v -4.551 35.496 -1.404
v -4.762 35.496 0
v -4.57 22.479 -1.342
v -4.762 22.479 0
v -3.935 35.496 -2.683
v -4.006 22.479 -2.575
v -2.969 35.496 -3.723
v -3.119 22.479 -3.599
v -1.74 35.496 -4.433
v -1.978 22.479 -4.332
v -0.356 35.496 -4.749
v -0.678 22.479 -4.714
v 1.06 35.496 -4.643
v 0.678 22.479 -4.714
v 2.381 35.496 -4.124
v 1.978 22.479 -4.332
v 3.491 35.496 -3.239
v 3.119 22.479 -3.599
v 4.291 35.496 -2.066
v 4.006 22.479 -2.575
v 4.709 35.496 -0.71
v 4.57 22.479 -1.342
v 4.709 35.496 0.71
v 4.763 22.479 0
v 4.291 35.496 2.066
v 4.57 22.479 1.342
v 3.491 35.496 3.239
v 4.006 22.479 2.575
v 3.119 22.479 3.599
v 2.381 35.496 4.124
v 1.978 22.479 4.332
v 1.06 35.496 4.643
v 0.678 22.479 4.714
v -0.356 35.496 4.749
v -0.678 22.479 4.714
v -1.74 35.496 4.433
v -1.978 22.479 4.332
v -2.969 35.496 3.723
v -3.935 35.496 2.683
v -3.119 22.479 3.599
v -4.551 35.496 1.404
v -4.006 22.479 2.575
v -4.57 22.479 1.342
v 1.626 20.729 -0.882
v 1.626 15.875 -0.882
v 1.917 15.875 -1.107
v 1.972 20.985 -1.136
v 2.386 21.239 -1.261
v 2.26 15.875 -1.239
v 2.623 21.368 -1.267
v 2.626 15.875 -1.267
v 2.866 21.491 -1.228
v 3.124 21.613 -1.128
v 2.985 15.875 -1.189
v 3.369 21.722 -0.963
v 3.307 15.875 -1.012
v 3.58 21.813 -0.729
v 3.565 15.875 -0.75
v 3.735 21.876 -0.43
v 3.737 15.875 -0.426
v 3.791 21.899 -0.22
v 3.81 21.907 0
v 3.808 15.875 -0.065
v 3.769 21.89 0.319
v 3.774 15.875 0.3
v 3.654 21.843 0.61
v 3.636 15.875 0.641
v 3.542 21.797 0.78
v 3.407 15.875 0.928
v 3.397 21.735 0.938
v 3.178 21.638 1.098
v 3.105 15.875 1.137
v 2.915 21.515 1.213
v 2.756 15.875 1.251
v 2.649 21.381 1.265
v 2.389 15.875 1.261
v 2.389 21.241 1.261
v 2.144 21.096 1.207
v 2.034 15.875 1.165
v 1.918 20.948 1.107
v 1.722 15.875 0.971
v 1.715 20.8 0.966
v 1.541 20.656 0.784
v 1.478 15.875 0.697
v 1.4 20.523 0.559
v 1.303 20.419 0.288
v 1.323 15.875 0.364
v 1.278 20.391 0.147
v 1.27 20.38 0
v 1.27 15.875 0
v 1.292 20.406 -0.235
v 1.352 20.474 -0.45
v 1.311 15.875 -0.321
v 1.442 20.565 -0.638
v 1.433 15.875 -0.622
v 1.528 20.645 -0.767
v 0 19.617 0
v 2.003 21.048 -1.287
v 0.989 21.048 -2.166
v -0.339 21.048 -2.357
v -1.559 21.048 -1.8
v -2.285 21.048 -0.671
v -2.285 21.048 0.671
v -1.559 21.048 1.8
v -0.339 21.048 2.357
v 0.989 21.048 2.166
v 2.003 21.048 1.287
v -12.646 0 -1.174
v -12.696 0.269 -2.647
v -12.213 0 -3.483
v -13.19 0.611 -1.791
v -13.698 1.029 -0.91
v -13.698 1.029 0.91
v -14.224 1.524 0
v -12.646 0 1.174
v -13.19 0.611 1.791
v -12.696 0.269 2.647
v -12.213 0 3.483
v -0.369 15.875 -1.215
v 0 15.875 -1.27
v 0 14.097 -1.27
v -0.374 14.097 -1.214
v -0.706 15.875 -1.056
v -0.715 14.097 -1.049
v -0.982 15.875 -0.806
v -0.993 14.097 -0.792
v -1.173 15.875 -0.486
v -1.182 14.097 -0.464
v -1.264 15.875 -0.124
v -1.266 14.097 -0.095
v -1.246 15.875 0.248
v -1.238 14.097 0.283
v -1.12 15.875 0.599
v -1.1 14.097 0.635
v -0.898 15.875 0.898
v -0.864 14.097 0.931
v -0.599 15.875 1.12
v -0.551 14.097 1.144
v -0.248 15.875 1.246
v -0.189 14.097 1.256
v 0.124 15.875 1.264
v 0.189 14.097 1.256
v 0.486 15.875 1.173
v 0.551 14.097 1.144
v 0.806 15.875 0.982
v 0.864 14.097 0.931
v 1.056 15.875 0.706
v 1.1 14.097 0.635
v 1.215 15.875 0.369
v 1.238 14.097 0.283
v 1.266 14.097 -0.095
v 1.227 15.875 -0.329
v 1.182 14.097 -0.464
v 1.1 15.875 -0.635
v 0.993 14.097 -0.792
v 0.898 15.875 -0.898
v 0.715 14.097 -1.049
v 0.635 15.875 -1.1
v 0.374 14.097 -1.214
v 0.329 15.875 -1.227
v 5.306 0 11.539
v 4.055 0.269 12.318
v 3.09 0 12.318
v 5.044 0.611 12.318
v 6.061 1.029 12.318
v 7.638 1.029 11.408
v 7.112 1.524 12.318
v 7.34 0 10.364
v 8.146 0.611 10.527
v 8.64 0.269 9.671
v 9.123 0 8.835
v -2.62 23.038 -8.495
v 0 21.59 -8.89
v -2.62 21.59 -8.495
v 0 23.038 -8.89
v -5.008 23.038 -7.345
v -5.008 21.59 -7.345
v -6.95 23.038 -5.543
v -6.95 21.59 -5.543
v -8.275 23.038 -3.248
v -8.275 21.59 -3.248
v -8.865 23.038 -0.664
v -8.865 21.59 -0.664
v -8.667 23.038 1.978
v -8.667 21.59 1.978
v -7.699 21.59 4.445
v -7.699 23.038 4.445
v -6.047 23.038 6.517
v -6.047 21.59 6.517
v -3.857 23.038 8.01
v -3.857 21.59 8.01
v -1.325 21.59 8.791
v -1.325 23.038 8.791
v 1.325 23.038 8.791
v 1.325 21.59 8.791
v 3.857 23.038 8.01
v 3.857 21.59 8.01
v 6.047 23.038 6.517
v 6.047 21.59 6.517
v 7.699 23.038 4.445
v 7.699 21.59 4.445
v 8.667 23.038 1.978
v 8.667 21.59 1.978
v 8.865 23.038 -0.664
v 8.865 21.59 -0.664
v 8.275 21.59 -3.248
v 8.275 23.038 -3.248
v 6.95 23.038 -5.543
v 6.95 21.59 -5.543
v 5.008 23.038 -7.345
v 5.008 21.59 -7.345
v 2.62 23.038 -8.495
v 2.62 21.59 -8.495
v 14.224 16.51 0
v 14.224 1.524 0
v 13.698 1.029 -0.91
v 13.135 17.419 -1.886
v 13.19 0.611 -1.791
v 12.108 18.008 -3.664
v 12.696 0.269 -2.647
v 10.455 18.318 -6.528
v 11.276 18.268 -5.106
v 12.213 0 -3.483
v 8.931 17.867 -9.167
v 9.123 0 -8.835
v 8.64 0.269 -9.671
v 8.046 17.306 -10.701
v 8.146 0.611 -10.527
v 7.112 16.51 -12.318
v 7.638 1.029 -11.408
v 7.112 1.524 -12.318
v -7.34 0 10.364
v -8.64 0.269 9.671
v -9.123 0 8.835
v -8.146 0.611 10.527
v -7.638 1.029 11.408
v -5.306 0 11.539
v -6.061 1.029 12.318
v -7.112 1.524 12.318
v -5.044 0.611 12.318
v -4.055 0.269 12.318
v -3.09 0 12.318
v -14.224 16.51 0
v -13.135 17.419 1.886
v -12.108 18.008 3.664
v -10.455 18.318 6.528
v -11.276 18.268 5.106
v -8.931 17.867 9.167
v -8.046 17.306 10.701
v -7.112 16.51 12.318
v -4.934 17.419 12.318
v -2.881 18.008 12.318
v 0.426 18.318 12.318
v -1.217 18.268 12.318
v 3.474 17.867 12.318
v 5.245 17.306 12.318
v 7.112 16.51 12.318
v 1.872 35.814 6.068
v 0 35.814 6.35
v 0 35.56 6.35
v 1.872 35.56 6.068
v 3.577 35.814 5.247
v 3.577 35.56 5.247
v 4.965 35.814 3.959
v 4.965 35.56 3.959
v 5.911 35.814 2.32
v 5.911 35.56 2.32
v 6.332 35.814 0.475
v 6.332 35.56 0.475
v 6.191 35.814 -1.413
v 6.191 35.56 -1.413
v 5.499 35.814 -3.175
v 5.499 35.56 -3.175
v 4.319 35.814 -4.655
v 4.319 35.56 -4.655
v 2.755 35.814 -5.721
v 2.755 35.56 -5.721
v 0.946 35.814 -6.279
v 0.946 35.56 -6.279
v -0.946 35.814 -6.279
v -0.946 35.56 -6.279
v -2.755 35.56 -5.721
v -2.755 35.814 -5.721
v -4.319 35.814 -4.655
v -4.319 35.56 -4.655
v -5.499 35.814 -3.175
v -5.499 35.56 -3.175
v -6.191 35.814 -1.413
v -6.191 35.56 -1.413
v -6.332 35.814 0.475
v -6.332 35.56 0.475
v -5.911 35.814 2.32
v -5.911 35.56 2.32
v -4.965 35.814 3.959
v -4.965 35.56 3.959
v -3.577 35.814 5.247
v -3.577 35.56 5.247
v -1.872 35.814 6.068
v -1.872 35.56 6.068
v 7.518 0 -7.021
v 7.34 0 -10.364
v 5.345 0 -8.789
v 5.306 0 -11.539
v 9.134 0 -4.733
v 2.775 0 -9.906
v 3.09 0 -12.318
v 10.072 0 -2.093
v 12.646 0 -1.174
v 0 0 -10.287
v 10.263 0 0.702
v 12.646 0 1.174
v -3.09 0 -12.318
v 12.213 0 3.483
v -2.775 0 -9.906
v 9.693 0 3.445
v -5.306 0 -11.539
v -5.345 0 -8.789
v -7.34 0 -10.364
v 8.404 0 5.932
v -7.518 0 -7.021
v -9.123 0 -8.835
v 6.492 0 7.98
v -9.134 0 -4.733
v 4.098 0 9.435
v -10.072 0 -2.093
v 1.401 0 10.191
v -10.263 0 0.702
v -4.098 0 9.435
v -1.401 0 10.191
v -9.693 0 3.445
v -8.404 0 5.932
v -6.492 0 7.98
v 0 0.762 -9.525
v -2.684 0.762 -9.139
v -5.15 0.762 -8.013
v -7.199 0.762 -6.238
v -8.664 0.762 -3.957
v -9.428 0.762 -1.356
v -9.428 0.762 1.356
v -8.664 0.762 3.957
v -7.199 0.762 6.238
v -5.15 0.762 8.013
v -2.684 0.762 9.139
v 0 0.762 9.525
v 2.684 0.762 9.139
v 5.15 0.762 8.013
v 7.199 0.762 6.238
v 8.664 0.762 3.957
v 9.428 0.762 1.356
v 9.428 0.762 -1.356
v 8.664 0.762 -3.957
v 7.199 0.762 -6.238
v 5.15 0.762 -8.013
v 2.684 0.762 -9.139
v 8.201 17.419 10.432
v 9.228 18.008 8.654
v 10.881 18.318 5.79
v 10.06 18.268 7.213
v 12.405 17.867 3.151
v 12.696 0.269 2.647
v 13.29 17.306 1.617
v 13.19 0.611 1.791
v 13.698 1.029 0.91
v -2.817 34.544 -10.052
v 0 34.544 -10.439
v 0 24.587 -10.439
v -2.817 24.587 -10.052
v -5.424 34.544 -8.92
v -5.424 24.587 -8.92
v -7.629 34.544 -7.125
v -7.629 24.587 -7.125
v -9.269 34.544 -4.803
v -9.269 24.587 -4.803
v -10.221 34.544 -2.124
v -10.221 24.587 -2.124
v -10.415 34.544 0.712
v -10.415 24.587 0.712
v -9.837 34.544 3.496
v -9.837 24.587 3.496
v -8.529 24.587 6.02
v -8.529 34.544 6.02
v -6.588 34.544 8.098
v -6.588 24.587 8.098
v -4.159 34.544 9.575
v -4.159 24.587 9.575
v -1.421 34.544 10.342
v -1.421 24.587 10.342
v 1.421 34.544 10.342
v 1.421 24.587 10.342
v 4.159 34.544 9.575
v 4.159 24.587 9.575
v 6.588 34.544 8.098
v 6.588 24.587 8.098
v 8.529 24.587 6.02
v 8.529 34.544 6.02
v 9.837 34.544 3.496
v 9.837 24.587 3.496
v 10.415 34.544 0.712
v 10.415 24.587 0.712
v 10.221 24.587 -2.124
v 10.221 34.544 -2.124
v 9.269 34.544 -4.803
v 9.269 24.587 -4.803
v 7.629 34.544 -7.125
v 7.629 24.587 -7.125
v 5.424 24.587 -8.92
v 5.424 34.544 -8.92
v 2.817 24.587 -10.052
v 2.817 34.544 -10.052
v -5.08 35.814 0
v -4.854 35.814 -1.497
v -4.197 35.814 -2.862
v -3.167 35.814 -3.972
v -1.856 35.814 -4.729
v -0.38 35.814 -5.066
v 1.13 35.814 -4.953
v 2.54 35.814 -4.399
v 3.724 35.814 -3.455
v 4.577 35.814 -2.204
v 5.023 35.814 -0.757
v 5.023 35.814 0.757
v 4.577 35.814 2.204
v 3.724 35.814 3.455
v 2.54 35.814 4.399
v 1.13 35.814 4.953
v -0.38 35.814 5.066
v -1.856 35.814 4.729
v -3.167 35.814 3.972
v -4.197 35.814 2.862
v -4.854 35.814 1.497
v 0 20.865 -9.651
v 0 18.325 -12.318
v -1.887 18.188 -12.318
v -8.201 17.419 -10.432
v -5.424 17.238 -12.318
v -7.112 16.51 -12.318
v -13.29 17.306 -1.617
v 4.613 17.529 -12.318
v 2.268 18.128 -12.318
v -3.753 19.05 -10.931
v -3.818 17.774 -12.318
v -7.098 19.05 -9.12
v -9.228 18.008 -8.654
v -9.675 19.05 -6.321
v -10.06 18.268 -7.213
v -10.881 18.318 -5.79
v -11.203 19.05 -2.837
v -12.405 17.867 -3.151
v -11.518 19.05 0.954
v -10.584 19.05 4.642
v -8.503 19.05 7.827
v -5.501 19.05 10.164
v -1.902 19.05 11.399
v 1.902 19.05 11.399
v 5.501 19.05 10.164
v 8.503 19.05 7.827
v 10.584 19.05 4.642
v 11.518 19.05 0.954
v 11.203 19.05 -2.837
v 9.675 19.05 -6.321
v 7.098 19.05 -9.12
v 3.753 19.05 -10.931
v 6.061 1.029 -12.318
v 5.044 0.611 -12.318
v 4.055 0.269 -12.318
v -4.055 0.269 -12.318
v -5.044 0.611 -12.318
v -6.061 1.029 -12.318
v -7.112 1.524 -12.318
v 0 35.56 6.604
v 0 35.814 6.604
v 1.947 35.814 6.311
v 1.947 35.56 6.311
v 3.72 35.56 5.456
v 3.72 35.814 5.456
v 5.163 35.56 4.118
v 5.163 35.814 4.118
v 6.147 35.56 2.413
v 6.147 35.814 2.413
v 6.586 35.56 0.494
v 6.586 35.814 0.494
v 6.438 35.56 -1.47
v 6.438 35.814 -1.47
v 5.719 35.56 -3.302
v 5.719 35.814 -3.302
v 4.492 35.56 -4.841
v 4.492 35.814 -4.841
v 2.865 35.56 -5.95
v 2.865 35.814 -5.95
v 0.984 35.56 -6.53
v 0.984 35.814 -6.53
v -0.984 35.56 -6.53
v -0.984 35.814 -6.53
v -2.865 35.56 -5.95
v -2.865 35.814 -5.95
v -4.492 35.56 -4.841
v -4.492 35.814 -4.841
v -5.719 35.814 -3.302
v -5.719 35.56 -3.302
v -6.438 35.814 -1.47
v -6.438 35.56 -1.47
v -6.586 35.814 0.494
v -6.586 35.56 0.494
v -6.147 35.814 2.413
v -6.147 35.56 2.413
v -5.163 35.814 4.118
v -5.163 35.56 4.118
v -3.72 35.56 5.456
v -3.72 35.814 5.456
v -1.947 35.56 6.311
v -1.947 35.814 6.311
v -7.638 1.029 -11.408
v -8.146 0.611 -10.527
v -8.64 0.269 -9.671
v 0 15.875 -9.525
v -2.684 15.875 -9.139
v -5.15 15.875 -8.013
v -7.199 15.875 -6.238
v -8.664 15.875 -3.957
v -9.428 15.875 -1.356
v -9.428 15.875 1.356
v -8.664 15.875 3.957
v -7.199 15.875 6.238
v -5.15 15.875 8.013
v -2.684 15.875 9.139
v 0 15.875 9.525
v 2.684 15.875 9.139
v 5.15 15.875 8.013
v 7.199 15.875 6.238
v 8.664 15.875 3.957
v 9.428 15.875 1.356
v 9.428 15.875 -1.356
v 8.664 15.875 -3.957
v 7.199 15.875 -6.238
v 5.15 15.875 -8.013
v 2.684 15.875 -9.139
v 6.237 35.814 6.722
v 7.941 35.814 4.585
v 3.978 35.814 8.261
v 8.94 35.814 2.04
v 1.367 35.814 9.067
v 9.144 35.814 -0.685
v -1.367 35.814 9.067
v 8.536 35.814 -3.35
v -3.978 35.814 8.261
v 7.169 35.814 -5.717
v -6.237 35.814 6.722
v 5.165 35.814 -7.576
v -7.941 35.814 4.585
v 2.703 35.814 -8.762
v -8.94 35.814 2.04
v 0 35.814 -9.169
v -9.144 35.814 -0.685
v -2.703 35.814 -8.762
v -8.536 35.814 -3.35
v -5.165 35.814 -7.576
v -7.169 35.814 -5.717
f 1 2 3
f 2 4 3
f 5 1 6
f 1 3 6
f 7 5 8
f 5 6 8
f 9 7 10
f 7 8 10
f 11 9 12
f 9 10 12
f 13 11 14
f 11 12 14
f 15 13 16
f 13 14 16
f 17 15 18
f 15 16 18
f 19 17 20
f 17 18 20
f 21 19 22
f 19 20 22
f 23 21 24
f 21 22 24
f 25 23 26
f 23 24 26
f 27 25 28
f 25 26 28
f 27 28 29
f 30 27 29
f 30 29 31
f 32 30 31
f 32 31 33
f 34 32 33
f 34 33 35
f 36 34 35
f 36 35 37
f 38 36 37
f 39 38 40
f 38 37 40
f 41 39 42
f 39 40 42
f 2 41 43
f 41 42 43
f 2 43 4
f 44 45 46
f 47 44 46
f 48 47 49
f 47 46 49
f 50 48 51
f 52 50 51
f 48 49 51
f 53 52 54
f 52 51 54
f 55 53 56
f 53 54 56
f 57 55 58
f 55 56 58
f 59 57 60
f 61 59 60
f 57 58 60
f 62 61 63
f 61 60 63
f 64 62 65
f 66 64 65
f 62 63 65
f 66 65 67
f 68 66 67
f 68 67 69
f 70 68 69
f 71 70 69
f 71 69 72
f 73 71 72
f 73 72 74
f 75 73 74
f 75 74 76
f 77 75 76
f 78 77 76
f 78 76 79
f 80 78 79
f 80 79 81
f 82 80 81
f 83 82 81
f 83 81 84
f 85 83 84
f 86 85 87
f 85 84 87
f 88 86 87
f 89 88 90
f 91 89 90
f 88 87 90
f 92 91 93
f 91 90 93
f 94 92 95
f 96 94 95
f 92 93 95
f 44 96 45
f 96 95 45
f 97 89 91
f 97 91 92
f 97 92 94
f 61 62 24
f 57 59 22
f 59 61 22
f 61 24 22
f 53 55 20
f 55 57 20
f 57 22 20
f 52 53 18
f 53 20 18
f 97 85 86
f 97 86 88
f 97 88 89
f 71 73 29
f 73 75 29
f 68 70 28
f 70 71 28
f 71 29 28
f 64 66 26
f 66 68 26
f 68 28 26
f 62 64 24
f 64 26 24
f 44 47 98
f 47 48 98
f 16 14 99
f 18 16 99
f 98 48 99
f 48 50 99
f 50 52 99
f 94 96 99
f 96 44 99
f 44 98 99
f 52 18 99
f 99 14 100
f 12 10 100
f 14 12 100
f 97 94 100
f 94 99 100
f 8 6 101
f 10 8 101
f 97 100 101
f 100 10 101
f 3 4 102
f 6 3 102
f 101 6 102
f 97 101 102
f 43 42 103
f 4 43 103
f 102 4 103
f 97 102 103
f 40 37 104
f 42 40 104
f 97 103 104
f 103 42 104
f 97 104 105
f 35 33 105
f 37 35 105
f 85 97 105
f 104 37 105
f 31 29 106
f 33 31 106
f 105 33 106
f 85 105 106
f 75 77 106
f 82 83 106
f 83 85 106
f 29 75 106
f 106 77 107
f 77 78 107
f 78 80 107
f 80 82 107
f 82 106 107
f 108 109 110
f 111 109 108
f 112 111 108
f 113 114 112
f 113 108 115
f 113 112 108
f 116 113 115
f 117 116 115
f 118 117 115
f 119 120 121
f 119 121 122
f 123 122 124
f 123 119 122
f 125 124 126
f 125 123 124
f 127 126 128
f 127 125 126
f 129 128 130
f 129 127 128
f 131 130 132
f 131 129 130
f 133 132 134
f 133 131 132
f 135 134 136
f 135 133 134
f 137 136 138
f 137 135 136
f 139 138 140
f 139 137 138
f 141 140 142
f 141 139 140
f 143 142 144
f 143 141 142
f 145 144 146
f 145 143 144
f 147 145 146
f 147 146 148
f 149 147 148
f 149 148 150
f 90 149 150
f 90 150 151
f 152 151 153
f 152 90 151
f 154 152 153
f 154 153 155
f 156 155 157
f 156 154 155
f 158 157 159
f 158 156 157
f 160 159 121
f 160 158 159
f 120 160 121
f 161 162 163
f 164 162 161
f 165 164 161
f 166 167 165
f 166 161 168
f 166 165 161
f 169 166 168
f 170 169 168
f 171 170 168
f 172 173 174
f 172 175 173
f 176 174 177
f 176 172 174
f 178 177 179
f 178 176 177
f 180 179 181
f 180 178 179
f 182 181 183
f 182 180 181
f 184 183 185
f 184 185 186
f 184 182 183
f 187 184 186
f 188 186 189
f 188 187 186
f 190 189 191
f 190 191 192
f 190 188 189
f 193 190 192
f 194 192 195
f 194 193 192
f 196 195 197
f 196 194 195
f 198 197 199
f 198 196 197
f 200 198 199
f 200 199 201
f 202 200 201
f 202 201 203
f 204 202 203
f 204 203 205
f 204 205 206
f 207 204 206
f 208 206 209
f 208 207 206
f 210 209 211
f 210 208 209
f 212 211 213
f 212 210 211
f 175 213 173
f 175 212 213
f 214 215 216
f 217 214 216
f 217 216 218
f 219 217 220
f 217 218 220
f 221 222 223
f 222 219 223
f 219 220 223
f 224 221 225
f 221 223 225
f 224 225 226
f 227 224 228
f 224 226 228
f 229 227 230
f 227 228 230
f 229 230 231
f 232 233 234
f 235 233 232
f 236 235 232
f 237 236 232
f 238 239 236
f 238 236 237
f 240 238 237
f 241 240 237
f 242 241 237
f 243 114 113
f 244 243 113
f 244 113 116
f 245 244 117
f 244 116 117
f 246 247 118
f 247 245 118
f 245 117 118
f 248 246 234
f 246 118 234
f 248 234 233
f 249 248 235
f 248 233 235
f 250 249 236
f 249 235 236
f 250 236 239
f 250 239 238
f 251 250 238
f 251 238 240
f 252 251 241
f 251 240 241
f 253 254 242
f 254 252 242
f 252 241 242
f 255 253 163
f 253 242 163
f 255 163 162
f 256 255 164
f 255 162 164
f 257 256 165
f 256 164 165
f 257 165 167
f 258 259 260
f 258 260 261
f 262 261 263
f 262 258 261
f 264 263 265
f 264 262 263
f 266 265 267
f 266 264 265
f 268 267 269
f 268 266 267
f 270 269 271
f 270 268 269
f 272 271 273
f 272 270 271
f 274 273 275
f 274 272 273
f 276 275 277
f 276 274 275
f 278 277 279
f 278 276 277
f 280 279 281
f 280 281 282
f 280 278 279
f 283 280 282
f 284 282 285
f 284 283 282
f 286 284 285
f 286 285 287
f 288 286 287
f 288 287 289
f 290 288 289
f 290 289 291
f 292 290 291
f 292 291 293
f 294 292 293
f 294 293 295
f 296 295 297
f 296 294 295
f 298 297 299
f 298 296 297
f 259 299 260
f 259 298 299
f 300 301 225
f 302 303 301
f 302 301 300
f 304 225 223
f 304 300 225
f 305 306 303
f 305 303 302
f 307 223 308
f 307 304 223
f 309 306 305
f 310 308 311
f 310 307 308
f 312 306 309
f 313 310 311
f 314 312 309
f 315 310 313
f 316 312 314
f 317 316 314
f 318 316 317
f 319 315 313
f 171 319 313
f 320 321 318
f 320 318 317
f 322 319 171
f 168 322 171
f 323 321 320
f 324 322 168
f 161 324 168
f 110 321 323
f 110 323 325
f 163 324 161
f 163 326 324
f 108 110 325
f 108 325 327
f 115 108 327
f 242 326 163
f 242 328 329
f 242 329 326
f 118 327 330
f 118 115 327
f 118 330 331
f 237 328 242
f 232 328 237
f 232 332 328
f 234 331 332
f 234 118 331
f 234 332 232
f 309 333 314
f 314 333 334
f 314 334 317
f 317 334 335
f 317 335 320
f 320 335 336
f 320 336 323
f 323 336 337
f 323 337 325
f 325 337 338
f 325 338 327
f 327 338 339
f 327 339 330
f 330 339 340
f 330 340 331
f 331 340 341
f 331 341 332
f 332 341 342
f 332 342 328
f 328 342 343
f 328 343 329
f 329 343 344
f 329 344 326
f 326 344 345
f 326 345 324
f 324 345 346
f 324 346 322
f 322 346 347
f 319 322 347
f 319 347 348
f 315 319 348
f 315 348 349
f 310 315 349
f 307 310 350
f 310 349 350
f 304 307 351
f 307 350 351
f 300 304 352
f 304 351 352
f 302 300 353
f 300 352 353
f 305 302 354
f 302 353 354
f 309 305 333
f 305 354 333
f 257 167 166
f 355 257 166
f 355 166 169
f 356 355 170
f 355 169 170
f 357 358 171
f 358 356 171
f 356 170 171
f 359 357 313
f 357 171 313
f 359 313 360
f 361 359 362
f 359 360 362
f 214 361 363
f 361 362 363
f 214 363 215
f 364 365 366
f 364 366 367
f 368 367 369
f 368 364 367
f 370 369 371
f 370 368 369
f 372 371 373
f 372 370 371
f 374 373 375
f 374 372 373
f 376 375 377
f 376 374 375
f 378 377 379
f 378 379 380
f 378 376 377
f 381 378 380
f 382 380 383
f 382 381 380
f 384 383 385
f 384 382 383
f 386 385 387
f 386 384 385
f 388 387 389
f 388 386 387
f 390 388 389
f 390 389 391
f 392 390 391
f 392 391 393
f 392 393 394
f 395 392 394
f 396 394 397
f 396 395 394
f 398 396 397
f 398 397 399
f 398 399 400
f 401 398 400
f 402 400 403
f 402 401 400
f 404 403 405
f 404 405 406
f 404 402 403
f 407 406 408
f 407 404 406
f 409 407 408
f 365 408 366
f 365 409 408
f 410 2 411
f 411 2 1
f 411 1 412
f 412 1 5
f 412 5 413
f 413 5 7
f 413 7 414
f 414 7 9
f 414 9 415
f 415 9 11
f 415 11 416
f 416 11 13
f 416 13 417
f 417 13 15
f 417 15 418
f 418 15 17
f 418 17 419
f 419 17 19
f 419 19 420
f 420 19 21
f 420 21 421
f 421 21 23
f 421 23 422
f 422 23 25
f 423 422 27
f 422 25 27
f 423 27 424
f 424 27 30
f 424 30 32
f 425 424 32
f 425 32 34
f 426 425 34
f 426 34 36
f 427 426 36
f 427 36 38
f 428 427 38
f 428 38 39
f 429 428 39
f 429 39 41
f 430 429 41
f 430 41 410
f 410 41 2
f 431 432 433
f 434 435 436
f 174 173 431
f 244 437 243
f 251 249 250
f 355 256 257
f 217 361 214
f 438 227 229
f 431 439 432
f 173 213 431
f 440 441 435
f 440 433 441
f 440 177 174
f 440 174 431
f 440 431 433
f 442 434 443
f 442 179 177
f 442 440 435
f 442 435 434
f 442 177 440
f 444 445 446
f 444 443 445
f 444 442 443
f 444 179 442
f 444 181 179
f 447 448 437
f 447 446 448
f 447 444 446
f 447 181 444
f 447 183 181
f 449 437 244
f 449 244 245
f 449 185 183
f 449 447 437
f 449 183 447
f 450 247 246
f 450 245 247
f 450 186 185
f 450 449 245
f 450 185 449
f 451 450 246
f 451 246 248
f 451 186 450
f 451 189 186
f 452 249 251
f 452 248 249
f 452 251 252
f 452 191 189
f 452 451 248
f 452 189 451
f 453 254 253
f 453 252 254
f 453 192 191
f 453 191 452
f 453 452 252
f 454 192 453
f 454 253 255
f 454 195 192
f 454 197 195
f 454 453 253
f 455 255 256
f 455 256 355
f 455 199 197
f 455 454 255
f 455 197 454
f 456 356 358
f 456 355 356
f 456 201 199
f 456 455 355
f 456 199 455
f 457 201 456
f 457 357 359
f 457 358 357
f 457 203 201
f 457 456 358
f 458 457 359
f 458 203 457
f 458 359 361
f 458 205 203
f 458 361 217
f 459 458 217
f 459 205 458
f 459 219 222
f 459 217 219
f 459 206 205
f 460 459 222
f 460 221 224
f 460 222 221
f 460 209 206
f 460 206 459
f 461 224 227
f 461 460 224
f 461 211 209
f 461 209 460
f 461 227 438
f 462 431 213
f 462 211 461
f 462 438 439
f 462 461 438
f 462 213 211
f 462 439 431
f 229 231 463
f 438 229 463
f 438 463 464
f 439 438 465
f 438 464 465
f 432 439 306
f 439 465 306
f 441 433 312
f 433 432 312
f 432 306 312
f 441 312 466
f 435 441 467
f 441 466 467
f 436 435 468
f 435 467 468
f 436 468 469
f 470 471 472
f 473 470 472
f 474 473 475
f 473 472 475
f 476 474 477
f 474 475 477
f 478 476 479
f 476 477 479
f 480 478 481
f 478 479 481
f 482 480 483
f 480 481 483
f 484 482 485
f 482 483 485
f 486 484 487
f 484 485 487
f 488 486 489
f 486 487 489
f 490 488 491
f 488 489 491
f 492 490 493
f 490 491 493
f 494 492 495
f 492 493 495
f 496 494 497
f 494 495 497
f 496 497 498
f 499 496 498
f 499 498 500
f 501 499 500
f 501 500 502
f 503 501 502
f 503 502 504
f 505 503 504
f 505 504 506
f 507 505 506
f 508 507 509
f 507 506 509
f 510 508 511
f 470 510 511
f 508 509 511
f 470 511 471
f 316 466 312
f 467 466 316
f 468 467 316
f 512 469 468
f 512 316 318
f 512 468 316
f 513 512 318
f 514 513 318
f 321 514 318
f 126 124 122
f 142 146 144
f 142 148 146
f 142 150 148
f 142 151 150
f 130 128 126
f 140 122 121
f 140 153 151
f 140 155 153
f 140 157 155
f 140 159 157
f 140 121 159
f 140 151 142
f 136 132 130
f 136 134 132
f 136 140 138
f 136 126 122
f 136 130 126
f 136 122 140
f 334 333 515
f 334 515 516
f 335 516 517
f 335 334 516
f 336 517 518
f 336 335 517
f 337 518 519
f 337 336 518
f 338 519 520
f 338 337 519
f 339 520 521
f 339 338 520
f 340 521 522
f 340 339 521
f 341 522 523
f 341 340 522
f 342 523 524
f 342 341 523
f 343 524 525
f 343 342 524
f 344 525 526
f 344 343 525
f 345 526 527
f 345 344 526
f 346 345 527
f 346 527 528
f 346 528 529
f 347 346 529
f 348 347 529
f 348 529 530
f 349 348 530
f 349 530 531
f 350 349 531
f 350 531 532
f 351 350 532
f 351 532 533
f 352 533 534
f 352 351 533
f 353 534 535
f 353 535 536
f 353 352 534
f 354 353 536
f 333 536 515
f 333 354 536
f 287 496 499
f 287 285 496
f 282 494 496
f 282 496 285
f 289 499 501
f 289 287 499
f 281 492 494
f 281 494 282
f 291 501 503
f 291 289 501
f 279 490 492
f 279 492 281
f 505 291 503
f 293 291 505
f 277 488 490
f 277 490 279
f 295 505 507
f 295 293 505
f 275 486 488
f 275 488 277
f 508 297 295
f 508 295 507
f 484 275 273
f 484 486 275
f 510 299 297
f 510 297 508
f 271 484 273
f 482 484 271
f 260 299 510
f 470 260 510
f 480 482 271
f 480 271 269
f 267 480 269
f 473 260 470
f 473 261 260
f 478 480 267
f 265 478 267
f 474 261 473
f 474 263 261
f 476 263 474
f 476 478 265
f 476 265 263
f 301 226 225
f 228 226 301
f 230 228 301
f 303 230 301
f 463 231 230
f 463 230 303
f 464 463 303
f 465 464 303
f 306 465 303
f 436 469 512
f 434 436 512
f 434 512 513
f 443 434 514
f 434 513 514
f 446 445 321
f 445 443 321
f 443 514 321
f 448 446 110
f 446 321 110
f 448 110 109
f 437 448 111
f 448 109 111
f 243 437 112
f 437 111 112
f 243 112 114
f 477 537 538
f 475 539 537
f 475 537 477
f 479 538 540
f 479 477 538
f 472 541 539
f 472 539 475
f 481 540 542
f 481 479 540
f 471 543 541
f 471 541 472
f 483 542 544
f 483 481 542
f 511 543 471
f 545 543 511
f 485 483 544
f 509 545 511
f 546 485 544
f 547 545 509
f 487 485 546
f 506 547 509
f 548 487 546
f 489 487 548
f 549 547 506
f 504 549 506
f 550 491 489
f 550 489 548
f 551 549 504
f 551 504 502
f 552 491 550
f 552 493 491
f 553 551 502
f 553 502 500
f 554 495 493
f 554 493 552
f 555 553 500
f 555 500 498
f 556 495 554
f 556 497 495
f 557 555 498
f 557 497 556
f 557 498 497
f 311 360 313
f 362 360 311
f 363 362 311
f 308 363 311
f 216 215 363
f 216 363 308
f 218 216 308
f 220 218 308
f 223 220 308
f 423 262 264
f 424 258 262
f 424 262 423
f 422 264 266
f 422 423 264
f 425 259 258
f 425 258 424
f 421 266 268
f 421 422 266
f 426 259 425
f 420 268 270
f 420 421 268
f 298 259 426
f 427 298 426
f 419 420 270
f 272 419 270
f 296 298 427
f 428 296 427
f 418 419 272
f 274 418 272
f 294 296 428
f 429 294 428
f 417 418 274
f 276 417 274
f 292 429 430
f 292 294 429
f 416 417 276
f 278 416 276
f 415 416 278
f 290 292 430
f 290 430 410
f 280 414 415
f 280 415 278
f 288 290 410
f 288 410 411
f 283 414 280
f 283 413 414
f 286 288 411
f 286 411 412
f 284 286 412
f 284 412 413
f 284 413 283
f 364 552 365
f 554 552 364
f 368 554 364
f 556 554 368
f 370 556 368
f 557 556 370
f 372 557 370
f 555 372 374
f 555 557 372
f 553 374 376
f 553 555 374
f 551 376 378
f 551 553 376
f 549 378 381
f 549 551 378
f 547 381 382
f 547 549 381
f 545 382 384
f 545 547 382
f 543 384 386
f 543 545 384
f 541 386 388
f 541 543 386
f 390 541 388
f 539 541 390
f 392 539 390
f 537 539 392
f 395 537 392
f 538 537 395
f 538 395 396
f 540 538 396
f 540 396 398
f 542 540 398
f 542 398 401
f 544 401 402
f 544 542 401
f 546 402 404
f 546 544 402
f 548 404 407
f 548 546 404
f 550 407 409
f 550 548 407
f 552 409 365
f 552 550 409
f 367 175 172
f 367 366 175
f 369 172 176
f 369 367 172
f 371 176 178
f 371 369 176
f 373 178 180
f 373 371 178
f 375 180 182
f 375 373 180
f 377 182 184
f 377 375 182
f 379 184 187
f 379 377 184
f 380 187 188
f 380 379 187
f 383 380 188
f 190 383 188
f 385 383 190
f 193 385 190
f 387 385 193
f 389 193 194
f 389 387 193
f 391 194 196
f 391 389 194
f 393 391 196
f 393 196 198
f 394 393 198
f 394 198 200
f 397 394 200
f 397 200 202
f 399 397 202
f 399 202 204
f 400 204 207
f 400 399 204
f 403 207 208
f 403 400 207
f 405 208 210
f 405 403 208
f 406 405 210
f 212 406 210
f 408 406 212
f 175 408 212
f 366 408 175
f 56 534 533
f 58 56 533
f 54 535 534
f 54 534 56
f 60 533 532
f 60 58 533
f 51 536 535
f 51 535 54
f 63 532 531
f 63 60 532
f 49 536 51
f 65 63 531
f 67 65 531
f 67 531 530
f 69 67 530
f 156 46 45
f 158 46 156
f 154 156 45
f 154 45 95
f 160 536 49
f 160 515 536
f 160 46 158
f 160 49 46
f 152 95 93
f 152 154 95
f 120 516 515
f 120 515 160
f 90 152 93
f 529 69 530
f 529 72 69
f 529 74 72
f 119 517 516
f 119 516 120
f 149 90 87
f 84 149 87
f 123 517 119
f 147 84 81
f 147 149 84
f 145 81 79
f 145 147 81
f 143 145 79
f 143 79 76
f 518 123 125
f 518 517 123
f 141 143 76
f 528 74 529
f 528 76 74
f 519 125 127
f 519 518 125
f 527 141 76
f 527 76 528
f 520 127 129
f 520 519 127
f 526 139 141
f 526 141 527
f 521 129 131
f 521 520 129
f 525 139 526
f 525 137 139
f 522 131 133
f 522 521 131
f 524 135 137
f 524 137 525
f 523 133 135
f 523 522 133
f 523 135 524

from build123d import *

# Parameters (mm, degrees)
F_3_8_0_375_DIAMETER_HOLE1_D           = 9.525
F_3_8_0_375_DIAMETER_HOLE1_DEPTH       = 13.335
F_3_8_0_375_DIAMETER_HOLE1_CSINK_D     = 10.16
F_3_8_0_375_DIAMETER_HOLE1_CSINK_ANGLE = 90
F_3_8_0_375_DIAMETER_HOLE1_TIP         = 2.861598698
SKETCH4_R                              = 1.27
CUT_EXTRUDE1_DEPTH                     = 29.323277935
CHAMFER1_SIZE                          = 1.524
CUT_EXTRUDE2_DEPTH                     = 42.076598545
CHAMFER2_SIZE                          = 1.27
SKETCH6_R                              = 6.604
SKETCH6_R_2                            = 6.35
CUT_EXTRUDE3_DEPTH                     = 0.254
CHAMFER3_SIZE                          = 0.762


with BuildPart() as part:
    # Sketch1 → Revolve1 (revolve)
    with BuildSketch(Plane.XY, mode=Mode.PRIVATE) as revolve1_sk:
        Polygon((9.525, 0), (14.224, 0), (14.224, 16.51), (8.89, 21.59), (8.89, 23.0378), (10.4394, 24.5872), (10.4394, 35.814), (0, 35.814), (0, 14.097), (1.27, 14.097), (1.27, 15.875), (9.525, 15.875), align=None)
    revolve(revolve1_sk.sketch.rotate(Axis((0, 1.826937735, 0), (0, 1, 0)), 90), axis=Axis((0, 1.826937735, 0), (0, 1, 0)))

    # 3/8 (0.375) Diameter Hole1
    with Locations(Plane(origin=(0, 35.814, 0), x_dir=(1, 0, 0), z_dir=(0, 1, 0))):
        with Locations((0, 0)):
            CounterSinkHole(F_3_8_0_375_DIAMETER_HOLE1_D / 2, F_3_8_0_375_DIAMETER_HOLE1_CSINK_D / 2, depth=F_3_8_0_375_DIAMETER_HOLE1_DEPTH, counter_sink_angle=F_3_8_0_375_DIAMETER_HOLE1_CSINK_ANGLE)
            with Locations((0, 0, -(F_3_8_0_375_DIAMETER_HOLE1_DEPTH + F_3_8_0_375_DIAMETER_HOLE1_TIP / 2))):  # 118° drill point
                Cone(0, F_3_8_0_375_DIAMETER_HOLE1_D / 2, F_3_8_0_375_DIAMETER_HOLE1_TIP, mode=Mode.SUBTRACT)

    # Sketch4 → Cut-Extrude1 (cut, through all)
    with BuildSketch(Plane.XZ.offset(-15.875)):
        with Locations(Location((2.54, 0, 0), (0, 0, 223.987874518))):
            Circle(SKETCH4_R)
    extrude(amount=-CUT_EXTRUDE1_DEPTH, mode=Mode.SUBTRACT)

    # Chamfer1
    chamfer1_edges = [part.edges().sort_by_distance(p)[0] for p in [
        (0, 0, 14.224),
    ]]
    chamfer(chamfer1_edges, length=CHAMFER1_SIZE)

    # Sketch5 → Cut-Extrude2 (cut, through all)
    with BuildSketch(Plane.XZ):
        with BuildLine():
            ThreePointArc((7.112, -12.318345343), (12.318345343, -7.112), (14.224, 0))
            Line((14.224, 0), (7.112, -12.318345343))
        make_face()
        with BuildLine():
            Line((7.112, 12.318345343), (14.224, 0))
            ThreePointArc((14.224, 0), (12.318345343, 7.112), (7.112, 12.318345343))
        make_face()
        with BuildLine():
            Line((-7.112, 12.318345343), (7.112, 12.318345343))
            ThreePointArc((7.112, 12.318345343), (0, 14.224), (-7.112, 12.318345343))
        make_face()
        with BuildLine():
            ThreePointArc((-7.112, -12.318345343), (0, -14.224), (7.112, -12.318345343))
            Line((7.112, -12.318345343), (-7.112, -12.318345343))
        make_face()
        with BuildLine():
            Line((-14.224, 0), (-7.112, 12.318345343))
            ThreePointArc((-7.112, 12.318345343), (-12.318345343, 7.112), (-14.224, 0))
        make_face()
        with BuildLine():
            ThreePointArc((-14.224, 0), (-12.318345343, -7.112), (-7.112, -12.318345343))
            Line((-7.112, -12.318345343), (-14.224, 0))
        make_face()
    extrude(amount=-CUT_EXTRUDE2_DEPTH, mode=Mode.SUBTRACT)

    # Chamfer2
    chamfer2_edges = [part.edges().sort_by_distance(p)[0] for p in [
        (0, 35.814, 10.4394),
    ]]
    chamfer(chamfer2_edges, length=CHAMFER2_SIZE)

    # Sketch6 → Cut-Extrude3 (cut)
    with BuildSketch(Plane(origin=(0, 35.814, 0), x_dir=(1, 0, 0), z_dir=(0, 1, 0))):
        with Locations(Location((0, 0, 0), (0, 0, 270))):
            Circle(SKETCH6_R)
        with Locations(Location((0, 0, 0), (0, 0, 270))):
            Circle(SKETCH6_R_2, mode=Mode.SUBTRACT)
    extrude(amount=-CUT_EXTRUDE3_DEPTH, mode=Mode.SUBTRACT)

    # Chamfer3
    chamfer3_edges = [part.edges().sort_by_distance(p)[0] for p in [
        (0, 0, 9.525),
    ]]
    chamfer(chamfer3_edges, length=CHAMFER3_SIZE)


solid = part.part
